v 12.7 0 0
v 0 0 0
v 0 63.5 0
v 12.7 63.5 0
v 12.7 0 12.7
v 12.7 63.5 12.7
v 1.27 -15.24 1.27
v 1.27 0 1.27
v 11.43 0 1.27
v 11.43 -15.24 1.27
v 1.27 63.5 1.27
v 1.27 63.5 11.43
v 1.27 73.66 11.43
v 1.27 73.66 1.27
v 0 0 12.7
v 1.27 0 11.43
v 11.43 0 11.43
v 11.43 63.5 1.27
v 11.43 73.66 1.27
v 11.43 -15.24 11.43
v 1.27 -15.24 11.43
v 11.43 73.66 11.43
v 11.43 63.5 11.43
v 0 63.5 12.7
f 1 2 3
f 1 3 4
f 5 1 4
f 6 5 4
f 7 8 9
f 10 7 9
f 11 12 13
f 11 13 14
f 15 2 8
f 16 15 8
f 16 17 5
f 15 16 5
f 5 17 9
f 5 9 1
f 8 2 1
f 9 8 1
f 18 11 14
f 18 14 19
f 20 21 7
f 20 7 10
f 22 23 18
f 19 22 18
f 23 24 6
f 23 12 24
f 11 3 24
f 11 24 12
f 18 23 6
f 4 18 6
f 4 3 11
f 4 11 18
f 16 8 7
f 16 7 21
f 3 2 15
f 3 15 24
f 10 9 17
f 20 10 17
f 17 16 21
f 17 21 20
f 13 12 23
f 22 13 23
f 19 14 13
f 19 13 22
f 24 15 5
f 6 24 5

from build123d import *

# Parameters (mm, degrees)
SKETCH1_W           = 12.7
SKETCH1_H           = 63.5
BOSS_EXTRUDE1_DEPTH = 12.7
SKETCH2_W           = 10.16
SKETCH2_H           = 10.16
BOSS_EXTRUDE2_DEPTH = 10.16
SKETCH3_W           = 10.16
SKETCH3_H           = 10.16
BOSS_EXTRUDE3_DEPTH = 15.24


with BuildPart() as part:
    # Sketch1 → Boss-Extrude1 (new body)
    with BuildSketch(Plane.XY):
        with Locations((6.35, 31.75)):
            Rectangle(SKETCH1_W, SKETCH1_H)
    extrude(amount=BOSS_EXTRUDE1_DEPTH)

    # Sketch2 → Boss-Extrude2 (add)
    with BuildSketch(Plane(origin=(0, 63.5, 0), x_dir=(1, 0, 0), z_dir=(0, 1, 0))):
        with Locations((6.35, -6.35)):
            Rectangle(SKETCH2_W, SKETCH2_H)
    extrude(amount=BOSS_EXTRUDE2_DEPTH)

    # Sketch3 → Boss-Extrude3 (add)
    with BuildSketch(Plane.XZ):
        with Locations((6.35, 6.35)):
            Rectangle(SKETCH3_W, SKETCH3_H)
    extrude(amount=BOSS_EXTRUDE3_DEPTH)


solid = part.part
